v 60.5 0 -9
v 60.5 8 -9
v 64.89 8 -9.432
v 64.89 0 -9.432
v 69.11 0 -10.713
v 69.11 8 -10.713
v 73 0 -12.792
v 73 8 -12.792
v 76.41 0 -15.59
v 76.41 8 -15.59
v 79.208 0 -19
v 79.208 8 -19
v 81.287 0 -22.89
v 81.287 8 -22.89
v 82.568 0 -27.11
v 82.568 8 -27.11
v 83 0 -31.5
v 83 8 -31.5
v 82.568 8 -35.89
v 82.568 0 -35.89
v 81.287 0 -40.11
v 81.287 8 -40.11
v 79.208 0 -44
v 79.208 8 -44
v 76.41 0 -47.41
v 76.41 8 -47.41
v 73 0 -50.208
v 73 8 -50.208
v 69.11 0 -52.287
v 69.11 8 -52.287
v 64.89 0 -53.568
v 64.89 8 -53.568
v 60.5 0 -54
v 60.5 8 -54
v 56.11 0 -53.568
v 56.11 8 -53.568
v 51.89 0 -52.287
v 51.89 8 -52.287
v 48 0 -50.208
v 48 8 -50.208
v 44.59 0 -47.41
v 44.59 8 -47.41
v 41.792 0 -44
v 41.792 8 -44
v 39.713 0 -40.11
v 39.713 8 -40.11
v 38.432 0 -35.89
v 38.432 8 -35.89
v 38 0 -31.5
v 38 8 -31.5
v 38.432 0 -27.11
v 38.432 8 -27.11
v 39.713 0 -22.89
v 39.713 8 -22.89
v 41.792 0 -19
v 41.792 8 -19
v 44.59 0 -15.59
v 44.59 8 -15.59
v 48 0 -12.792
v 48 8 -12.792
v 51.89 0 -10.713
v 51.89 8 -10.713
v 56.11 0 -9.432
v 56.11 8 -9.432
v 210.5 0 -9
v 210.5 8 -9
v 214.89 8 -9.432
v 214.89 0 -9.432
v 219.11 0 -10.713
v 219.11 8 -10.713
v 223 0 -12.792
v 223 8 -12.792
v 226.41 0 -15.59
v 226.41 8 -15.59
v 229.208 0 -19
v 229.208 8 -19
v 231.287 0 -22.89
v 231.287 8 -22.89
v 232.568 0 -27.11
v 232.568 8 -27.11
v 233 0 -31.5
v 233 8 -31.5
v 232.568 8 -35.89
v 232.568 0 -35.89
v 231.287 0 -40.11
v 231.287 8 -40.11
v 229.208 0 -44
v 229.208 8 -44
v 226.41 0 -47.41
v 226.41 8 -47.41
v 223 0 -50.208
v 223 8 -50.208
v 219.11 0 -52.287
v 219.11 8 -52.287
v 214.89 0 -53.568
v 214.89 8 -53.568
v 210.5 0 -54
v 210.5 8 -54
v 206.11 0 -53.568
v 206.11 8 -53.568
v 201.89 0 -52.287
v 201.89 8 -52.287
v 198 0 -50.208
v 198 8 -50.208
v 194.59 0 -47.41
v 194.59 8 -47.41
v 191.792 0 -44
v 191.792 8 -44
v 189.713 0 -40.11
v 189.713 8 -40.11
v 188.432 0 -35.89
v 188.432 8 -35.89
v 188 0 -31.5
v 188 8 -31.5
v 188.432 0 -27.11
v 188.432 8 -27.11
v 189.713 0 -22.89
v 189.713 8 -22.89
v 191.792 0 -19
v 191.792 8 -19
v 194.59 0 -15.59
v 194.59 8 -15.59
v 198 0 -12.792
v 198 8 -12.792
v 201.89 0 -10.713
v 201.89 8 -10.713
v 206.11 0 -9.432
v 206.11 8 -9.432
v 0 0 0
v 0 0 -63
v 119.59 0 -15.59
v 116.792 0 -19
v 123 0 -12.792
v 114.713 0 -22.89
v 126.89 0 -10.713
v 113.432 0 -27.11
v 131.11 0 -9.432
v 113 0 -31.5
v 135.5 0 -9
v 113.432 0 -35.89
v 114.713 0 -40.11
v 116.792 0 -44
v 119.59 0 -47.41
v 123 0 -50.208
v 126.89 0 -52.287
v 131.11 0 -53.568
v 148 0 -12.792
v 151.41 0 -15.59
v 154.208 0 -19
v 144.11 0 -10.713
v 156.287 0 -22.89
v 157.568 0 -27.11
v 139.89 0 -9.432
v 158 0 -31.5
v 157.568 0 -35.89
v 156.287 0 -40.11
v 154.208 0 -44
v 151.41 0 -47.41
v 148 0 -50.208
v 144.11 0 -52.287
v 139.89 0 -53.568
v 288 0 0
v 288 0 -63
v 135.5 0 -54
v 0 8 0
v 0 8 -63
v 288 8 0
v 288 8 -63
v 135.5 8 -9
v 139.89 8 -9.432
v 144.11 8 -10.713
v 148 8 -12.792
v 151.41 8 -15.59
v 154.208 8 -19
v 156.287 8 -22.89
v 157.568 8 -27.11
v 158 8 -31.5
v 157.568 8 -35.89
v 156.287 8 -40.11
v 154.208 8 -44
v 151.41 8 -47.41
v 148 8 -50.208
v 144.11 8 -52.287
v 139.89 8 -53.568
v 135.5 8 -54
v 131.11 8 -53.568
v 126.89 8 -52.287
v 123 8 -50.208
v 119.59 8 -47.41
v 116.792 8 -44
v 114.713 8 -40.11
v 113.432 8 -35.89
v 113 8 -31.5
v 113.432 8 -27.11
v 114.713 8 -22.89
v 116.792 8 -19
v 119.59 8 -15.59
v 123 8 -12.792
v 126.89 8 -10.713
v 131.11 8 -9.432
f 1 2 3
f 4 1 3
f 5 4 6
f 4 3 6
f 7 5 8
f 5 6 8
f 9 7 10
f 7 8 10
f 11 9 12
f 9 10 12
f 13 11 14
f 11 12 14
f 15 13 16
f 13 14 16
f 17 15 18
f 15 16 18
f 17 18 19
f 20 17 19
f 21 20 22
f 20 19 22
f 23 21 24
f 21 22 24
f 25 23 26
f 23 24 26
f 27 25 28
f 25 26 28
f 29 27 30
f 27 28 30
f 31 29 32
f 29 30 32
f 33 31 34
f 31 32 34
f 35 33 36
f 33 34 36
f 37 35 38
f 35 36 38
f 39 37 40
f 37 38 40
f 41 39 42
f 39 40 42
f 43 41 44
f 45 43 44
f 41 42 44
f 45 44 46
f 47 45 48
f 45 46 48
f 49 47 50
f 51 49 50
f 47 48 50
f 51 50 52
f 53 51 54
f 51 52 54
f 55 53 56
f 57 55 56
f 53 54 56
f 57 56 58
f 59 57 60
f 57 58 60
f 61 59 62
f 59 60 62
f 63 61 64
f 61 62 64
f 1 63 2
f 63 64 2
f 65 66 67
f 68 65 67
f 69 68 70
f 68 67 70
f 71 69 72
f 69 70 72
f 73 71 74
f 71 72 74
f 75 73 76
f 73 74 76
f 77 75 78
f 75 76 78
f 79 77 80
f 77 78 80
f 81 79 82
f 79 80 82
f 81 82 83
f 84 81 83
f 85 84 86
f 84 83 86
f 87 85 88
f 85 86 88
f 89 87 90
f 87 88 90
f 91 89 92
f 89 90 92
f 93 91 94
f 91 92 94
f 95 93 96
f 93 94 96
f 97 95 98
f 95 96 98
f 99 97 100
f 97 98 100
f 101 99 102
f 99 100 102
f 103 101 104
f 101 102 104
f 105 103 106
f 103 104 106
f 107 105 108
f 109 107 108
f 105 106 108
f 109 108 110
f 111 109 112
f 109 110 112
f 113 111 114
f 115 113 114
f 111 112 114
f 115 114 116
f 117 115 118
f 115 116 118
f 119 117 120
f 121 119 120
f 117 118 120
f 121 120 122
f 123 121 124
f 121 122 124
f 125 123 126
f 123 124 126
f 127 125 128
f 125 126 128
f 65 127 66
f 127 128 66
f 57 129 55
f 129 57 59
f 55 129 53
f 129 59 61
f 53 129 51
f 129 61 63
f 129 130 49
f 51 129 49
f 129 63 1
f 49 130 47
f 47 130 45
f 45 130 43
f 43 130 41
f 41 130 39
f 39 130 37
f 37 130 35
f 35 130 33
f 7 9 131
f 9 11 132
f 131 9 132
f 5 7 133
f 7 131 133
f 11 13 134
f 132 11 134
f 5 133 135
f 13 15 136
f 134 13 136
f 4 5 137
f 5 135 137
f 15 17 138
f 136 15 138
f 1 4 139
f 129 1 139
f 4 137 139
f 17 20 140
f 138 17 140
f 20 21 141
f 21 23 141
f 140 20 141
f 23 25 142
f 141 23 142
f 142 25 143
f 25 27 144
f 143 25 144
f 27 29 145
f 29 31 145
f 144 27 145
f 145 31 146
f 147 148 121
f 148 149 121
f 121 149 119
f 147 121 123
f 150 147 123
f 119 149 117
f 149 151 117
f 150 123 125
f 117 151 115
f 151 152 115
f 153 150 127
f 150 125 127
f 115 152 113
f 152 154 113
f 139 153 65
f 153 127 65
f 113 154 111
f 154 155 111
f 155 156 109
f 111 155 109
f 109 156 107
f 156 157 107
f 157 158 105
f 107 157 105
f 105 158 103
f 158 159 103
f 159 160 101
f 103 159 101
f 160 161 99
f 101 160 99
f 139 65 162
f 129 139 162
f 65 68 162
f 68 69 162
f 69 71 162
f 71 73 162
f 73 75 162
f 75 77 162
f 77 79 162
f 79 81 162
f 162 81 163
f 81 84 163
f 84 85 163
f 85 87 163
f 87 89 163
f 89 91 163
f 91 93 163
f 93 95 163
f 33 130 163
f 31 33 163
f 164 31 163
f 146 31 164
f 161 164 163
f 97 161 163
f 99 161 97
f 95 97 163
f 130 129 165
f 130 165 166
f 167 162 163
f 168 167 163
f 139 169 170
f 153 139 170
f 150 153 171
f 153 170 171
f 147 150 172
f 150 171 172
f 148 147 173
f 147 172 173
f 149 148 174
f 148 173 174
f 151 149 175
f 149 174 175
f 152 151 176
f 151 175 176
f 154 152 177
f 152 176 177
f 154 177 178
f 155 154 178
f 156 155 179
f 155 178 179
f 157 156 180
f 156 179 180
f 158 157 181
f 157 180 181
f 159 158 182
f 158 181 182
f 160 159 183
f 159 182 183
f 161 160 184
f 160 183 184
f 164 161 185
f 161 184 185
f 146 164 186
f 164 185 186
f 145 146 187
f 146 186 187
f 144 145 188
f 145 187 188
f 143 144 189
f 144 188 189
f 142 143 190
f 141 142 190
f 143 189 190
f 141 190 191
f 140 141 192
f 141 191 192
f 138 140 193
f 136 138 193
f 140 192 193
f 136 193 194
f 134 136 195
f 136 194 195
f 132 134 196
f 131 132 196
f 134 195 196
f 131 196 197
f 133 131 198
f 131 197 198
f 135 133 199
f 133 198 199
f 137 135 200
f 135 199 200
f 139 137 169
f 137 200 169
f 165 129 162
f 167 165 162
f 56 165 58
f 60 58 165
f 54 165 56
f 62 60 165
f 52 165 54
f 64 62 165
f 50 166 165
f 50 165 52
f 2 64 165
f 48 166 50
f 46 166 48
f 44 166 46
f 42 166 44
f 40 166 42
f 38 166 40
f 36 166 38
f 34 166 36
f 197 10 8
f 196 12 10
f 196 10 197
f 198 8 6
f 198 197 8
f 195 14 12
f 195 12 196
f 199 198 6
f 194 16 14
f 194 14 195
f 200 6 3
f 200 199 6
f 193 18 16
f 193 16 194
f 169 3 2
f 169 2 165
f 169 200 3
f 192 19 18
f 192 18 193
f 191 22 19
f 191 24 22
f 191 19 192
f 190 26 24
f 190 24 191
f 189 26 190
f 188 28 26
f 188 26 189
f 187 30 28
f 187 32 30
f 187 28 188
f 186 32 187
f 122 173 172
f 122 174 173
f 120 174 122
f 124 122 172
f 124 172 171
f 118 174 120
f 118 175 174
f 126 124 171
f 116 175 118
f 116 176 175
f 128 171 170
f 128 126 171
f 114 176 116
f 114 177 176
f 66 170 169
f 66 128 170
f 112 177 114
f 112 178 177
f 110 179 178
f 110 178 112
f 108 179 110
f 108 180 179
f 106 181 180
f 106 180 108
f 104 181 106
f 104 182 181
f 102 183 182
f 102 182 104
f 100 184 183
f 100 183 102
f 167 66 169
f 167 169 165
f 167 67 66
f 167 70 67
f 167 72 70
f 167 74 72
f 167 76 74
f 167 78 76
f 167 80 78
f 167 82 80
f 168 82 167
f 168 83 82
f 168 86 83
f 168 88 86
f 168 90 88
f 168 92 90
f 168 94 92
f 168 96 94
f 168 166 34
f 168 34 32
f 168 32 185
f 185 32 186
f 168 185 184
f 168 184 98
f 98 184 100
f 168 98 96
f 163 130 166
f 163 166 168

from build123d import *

# Parameters (mm, degrees)
SKETCH_1_W          = 288
SKETCH_1_H          = 63
EXTRUDE_1_DEPTH     = 8
SKETCH_2_R          = 22.5
CUT_EXTRUDE_1_DEPTH = 8
SKETCH_2_3_R        = 22.5
CUT_EXTRUDE_2_DEPTH = 8
SKETCH_2_4_R        = 22.5
CUT_EXTRUDE_3_DEPTH = 8


with BuildPart() as part:
    # Эскиз1 → Бобышка-Вытянуть1 (new body)
    with BuildSketch(Plane(origin=(0, 0, 0), x_dir=(1, 0, 0), z_dir=(0, 1, 0))):
        with Locations((144, 31.5)):
            Rectangle(SKETCH_1_W, SKETCH_1_H)
    extrude(amount=EXTRUDE_1_DEPTH)

    # Эскиз2 → Вырез-Вытянуть1 (cut)
    with BuildSketch(Plane(origin=(0, 8, 0), x_dir=(1, 0, 0), z_dir=(0, 1, 0))):
        with Locations((60.5, 31.5)):
            Circle(SKETCH_2_R)
    extrude(amount=-CUT_EXTRUDE_1_DEPTH, mode=Mode.SUBTRACT)

    # Эскиз2<3> → Вырез-Вытянуть2 (cut)
    with BuildSketch(Plane(origin=(0, 8, 0), x_dir=(1, 0, 0), z_dir=(0, 1, 0))):
        with Locations((135.5, 31.5)):
            Circle(SKETCH_2_3_R)
    extrude(amount=-CUT_EXTRUDE_2_DEPTH, mode=Mode.SUBTRACT)

    # Эскиз2<4> → Вырез-Вытянуть3 (cut)
    with BuildSketch(Plane(origin=(0, 8, 0), x_dir=(1, 0, 0), z_dir=(0, 1, 0))):
        with Locations((210.5, 31.5)):
            Circle(SKETCH_2_4_R)
    extrude(amount=-CUT_EXTRUDE_3_DEPTH, mode=Mode.SUBTRACT)


solid = part.part
